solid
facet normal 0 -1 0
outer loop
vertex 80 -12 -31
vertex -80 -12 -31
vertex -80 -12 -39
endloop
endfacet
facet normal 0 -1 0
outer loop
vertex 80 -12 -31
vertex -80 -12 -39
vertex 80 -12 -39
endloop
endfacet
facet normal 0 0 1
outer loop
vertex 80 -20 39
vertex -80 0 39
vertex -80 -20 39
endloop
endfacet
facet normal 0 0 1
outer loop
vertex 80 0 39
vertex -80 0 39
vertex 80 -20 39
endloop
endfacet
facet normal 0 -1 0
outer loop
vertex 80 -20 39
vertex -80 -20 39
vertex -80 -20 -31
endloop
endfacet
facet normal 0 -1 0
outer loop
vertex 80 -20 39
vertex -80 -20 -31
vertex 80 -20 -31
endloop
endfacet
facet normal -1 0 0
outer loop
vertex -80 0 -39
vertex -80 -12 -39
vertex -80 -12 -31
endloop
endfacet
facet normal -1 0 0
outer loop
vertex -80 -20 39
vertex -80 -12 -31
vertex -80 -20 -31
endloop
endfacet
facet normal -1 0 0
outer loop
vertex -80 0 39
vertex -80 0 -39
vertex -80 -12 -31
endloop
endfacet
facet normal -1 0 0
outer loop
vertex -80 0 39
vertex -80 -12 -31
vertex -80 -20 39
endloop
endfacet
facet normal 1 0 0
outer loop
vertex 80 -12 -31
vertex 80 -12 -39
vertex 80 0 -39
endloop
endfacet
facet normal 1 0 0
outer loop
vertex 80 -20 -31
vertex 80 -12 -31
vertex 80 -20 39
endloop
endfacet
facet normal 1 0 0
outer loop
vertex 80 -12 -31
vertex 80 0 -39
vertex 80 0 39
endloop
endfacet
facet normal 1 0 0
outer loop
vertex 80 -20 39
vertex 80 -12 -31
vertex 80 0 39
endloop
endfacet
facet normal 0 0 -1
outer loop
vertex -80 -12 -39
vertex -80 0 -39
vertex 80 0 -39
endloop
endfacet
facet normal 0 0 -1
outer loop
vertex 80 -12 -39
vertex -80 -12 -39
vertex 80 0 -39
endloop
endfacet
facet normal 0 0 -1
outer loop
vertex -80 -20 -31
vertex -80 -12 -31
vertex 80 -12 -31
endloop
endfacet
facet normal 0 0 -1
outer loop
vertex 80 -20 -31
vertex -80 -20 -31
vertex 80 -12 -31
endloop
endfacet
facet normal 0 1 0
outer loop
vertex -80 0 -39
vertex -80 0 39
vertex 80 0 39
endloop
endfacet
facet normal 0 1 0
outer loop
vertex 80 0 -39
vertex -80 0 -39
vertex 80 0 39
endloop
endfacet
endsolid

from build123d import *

# Parameters (mm, degrees)
F0_W     = 160
F0_H     = 70
F1_DEPTH = 20
F0_H_2   = 8
F2_DEPTH = 12


with BuildPart() as f1:
    # F0 (on Front) → F1 (new body)
    with BuildSketch(Plane.XZ):
        with Locations((0, 4)):
            Rectangle(F0_W, F0_H)
    extrude(amount=F1_DEPTH)

    # F0 (on Front) → F2 (join)
    with BuildSketch(Plane.XZ):
        with Locations((0, 4)):
            Rectangle(F0_W, F0_H)
        with Locations((0, -35)):
            Rectangle(F0_W, F0_H_2)
    extrude(amount=F2_DEPTH)


solid = f1.part
